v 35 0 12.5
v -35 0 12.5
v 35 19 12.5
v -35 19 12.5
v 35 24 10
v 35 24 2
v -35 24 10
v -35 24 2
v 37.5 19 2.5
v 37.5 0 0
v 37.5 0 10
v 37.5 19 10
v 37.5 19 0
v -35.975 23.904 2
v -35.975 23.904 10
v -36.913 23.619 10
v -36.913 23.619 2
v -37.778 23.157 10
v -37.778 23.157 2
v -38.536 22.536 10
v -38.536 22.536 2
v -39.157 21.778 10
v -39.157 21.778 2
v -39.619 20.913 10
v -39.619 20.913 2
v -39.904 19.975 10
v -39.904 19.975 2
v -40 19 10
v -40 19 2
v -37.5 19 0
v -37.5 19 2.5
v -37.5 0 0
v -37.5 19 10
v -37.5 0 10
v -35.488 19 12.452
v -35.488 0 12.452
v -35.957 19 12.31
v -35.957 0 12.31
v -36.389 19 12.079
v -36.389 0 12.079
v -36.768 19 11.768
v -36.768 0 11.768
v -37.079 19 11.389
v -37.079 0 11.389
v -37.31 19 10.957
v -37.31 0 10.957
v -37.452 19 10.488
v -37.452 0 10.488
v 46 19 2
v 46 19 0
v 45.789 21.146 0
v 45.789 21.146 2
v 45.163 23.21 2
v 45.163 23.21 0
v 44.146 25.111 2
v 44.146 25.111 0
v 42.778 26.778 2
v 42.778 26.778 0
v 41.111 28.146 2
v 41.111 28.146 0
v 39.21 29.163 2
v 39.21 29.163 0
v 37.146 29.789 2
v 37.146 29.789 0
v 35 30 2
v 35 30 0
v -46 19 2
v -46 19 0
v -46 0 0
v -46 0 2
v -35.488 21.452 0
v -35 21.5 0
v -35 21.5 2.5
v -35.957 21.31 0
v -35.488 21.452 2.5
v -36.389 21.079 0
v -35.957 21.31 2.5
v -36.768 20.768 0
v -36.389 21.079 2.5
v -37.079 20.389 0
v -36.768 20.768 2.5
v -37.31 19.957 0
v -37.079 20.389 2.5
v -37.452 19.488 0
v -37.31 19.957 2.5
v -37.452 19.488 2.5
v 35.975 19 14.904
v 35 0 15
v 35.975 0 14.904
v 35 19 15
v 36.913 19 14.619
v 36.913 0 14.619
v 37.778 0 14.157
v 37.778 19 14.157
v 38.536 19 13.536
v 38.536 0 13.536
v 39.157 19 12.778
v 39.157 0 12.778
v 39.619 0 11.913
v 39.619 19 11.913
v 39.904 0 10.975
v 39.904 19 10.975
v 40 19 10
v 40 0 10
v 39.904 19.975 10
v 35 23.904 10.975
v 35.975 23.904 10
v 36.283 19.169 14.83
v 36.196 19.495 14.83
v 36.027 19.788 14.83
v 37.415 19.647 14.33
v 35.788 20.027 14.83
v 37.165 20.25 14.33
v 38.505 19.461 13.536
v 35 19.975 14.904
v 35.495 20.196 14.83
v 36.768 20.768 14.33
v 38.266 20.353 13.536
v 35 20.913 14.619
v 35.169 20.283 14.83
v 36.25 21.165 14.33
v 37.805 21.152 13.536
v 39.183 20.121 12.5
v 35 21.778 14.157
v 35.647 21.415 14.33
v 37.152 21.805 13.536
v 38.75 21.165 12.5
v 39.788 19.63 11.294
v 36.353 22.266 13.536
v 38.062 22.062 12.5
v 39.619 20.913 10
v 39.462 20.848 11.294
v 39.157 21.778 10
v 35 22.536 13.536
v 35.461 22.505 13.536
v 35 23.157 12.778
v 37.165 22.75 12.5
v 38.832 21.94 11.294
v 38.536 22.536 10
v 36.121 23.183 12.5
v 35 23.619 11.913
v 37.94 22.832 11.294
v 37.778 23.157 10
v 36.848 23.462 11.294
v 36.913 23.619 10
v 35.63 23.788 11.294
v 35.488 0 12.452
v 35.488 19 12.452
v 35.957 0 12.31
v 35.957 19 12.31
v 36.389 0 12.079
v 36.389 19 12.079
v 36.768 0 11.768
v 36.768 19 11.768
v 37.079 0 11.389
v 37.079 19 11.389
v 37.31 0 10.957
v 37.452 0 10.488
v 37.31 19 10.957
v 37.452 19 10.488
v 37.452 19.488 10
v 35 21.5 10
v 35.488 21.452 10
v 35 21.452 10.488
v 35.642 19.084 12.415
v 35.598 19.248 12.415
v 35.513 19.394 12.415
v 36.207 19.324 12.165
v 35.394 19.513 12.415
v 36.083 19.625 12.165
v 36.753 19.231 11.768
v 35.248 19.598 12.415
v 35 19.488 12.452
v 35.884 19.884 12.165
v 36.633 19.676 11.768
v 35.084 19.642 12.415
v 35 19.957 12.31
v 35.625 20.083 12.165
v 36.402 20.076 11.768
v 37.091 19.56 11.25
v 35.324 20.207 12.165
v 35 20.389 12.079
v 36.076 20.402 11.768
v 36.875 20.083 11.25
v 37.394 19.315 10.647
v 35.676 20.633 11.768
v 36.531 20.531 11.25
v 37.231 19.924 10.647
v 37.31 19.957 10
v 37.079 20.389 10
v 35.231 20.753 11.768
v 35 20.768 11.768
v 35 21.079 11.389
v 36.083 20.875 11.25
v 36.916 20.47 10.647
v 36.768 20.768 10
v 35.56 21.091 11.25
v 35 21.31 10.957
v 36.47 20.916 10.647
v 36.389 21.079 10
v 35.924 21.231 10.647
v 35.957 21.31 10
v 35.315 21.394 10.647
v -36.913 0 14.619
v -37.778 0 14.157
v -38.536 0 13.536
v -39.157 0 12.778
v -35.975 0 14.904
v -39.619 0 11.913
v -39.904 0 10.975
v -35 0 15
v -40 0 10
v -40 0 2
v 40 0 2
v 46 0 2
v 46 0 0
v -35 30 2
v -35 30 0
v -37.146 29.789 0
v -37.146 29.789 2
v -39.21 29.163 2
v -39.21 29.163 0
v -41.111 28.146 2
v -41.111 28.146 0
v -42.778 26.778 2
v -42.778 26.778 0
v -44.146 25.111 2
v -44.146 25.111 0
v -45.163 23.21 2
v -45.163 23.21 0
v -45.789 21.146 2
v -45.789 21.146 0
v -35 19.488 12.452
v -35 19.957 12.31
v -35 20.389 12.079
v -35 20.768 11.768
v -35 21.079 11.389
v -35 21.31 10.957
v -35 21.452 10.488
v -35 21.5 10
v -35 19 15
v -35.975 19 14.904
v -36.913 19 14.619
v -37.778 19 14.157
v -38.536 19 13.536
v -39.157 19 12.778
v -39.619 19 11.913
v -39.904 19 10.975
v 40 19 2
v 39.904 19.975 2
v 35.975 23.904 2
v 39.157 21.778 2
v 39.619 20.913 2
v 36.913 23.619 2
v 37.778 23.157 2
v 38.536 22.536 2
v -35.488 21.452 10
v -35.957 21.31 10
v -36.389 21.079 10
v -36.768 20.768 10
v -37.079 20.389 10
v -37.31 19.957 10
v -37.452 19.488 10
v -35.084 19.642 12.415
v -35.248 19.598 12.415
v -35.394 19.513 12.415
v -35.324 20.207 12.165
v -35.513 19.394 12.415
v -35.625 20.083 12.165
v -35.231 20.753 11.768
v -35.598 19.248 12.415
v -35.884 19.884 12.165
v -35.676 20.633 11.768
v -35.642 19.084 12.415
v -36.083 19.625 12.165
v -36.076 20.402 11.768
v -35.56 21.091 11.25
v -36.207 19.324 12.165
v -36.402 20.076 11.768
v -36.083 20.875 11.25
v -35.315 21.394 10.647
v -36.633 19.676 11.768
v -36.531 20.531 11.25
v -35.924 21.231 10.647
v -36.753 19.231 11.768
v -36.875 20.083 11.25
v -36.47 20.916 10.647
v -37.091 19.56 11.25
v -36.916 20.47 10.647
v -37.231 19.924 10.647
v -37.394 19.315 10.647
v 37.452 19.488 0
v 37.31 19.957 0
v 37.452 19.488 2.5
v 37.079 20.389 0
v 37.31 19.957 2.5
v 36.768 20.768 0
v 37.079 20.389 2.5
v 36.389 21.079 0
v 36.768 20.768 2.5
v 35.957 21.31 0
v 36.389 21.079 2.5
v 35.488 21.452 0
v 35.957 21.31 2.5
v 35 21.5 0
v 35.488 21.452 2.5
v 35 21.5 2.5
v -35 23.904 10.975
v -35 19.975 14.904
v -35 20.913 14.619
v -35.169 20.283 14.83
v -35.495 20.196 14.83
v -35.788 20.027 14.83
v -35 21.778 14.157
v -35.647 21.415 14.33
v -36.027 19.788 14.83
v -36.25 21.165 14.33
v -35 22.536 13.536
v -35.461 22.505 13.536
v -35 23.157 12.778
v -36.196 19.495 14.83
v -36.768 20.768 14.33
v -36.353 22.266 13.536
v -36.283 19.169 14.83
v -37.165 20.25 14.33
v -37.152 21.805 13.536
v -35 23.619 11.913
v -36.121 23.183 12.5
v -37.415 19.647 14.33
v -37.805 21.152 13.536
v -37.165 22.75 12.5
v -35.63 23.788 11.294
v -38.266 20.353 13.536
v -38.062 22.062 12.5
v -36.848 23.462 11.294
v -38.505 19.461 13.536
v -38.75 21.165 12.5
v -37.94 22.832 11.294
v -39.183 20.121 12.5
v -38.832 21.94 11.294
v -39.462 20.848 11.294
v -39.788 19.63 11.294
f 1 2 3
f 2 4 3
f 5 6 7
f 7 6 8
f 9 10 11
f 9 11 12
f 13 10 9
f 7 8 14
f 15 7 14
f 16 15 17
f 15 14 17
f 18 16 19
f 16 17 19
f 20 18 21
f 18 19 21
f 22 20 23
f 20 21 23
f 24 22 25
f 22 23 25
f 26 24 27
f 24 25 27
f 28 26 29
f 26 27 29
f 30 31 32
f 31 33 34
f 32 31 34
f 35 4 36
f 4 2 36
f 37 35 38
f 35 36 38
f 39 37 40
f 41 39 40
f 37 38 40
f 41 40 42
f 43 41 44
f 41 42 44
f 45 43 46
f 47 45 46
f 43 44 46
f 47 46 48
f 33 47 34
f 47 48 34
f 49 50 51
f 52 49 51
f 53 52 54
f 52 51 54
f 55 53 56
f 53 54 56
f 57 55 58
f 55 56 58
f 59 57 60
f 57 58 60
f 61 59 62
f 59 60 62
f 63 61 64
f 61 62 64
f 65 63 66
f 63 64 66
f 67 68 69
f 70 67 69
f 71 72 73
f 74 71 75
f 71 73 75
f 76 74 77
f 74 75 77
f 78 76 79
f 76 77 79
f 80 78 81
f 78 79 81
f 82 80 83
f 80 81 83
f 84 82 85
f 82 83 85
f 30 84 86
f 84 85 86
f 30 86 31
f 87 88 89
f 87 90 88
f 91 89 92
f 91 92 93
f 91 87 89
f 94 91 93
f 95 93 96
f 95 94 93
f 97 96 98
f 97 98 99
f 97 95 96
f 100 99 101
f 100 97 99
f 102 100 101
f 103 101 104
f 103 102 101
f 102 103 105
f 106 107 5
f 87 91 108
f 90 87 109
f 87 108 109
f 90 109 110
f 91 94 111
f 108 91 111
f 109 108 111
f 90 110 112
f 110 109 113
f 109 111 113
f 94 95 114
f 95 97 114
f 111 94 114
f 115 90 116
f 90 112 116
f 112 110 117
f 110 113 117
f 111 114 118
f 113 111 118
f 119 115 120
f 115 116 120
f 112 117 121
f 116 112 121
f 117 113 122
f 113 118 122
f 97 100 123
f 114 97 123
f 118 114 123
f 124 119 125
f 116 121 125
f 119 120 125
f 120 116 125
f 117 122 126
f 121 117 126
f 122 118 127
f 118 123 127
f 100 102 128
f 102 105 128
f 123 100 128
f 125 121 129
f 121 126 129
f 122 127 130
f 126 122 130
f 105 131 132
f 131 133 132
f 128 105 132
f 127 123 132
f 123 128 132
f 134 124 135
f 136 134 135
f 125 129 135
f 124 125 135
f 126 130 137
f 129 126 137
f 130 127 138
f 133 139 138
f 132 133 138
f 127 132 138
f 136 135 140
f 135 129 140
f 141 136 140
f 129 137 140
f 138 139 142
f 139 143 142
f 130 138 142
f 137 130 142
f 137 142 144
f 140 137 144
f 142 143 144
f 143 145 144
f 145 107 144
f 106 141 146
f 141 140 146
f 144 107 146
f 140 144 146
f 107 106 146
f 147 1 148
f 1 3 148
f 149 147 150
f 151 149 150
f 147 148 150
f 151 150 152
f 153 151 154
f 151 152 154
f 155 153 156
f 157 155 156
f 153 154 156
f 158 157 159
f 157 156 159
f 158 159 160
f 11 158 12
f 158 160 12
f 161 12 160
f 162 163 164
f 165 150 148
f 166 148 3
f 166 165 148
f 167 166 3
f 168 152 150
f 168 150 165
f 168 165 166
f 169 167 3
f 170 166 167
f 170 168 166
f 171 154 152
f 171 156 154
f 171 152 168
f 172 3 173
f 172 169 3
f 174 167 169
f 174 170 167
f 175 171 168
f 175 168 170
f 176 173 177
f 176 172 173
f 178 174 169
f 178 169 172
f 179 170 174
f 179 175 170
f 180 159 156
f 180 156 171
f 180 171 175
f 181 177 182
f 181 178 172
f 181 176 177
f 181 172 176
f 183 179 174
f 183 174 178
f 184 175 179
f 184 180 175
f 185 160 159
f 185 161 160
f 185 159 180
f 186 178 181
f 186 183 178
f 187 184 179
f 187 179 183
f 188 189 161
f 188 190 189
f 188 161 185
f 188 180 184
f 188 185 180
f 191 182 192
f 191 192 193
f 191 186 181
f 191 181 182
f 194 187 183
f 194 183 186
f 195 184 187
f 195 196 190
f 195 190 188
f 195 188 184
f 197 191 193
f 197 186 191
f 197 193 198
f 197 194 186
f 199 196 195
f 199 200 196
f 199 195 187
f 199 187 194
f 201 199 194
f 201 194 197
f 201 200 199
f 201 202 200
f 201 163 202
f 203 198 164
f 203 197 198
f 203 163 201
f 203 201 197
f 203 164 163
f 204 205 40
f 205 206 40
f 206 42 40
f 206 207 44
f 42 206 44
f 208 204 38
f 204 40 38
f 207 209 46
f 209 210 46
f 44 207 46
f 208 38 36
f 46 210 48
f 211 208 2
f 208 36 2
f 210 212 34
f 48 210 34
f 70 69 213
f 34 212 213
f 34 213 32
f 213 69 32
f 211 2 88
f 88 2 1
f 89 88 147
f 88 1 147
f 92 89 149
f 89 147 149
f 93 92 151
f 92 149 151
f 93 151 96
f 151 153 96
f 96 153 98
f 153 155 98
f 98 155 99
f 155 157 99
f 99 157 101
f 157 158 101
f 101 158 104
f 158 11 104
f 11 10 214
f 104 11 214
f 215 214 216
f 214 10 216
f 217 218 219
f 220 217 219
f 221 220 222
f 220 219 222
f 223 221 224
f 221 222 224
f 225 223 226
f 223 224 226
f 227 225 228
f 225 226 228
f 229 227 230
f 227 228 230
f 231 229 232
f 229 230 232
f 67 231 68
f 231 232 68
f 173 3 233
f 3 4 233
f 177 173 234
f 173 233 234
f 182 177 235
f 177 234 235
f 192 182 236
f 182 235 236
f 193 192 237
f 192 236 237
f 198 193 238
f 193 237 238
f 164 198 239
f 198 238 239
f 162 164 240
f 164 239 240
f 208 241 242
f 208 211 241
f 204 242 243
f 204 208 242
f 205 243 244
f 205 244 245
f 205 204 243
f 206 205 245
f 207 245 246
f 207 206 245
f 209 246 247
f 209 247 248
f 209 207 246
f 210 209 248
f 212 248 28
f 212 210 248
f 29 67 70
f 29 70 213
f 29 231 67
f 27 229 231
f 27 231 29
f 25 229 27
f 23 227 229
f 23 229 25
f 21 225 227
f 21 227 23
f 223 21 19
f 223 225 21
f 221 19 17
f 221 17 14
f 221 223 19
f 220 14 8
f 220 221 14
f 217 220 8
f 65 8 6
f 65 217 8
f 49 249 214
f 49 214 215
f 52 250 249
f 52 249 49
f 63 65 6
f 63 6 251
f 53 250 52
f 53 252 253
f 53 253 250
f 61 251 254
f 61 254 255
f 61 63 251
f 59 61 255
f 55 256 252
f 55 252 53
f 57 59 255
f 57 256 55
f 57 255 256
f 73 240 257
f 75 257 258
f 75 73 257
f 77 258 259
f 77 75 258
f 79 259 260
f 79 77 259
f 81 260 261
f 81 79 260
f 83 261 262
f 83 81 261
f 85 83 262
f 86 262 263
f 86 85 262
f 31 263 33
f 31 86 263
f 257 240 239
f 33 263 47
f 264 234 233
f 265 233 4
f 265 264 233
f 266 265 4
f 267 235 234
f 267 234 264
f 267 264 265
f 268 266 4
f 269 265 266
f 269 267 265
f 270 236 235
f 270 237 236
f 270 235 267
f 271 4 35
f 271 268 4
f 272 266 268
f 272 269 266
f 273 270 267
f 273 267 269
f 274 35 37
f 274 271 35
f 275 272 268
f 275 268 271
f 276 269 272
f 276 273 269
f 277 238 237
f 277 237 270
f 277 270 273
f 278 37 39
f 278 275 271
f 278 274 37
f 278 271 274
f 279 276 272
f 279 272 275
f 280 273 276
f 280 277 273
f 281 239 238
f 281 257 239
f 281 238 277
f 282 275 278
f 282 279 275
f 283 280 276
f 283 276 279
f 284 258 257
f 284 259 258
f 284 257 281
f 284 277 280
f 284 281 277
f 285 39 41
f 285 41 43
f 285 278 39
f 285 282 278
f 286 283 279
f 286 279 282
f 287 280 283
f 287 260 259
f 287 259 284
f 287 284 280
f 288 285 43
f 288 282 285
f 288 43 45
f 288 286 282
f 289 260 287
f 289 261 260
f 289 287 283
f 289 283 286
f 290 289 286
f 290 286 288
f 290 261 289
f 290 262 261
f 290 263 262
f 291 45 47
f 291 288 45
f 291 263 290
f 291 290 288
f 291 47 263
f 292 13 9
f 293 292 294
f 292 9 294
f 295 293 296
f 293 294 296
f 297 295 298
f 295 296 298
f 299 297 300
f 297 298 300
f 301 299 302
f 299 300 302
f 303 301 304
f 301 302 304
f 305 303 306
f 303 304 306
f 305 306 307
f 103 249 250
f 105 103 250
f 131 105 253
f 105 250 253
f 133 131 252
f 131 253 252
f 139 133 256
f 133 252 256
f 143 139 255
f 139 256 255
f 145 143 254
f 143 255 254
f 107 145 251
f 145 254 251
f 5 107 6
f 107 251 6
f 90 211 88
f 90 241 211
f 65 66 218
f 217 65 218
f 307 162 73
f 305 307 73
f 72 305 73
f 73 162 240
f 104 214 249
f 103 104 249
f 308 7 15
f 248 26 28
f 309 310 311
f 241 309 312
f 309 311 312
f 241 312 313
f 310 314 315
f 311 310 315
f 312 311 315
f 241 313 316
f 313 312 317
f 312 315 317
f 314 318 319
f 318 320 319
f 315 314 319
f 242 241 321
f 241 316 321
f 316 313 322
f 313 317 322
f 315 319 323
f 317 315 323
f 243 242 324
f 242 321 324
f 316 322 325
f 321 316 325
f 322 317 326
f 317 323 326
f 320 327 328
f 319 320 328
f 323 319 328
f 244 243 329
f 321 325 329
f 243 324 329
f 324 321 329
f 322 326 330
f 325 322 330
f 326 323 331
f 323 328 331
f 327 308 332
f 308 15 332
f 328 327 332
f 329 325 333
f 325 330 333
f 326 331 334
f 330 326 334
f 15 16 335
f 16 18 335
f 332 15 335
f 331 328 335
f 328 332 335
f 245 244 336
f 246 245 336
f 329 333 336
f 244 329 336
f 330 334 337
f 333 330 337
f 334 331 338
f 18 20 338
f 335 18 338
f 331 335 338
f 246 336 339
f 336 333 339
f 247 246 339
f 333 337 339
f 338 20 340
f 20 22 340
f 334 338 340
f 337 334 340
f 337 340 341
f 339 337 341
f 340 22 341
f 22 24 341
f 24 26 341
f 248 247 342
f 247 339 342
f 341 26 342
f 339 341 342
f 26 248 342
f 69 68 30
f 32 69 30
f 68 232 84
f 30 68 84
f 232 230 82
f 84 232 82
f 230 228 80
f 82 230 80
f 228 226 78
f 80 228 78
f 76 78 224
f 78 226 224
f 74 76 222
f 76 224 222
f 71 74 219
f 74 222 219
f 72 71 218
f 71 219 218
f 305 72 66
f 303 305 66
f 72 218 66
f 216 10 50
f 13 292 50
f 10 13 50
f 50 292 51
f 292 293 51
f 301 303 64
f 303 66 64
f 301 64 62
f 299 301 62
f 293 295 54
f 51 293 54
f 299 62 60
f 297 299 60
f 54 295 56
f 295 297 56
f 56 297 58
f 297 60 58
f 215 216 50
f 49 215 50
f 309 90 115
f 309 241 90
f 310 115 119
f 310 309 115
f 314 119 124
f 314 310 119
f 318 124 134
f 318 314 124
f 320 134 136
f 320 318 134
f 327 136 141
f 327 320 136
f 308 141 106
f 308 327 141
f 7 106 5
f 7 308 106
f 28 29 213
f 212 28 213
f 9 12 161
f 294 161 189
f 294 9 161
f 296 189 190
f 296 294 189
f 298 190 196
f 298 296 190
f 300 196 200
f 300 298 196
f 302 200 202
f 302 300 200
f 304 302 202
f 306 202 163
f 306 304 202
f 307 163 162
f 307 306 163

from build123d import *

# Parameters (mm, degrees)
F1_DEPTH = 2
F3_DEPTH = 15
F4_R     = 5
F5_T     = -2.5
F7_DEPTH = 25


with BuildPart() as f1:
    # F0 (on Top) → F1 (new body)
    with BuildSketch(Plane.XY):
        with BuildLine():
            Line((-46, 19), (-46, 0))
            Line((-46, 0), (-40, 0))
            Line((-40, 0), (-40, 19))
            ThreePointArc((-40, 19), (-38.5355339059, 22.5355339059), (-35, 24))
            Line((-35, 24), (35, 24))
            ThreePointArc((35, 24), (38.5355339059, 22.5355339059), (40, 19))
            Line((40, 19), (40, 0))
            Line((40, 0), (46, 0))
            Line((46, 0), (46, 19))
            ThreePointArc((46, 19), (42.7781745931, 26.7781745931), (35, 30))
            Line((35, 30), (-35, 30))
            ThreePointArc((-35, 30), (-42.7781745931, 26.7781745931), (-46, 19))
        make_face()
    extrude(amount=F1_DEPTH)

    # F2 (on Top) → F3 (join)
    with BuildSketch(Plane.XY):
        with BuildLine():
            Line((-40, 0), (40, 0))
            Line((40, 0), (40, 19))
            ThreePointArc((40, 19), (38.5355339059, 22.5355339059), (35, 24))
            Line((35, 24), (-35, 24))
            ThreePointArc((-35, 24), (-38.5355339059, 22.5355339059), (-40, 19))
            Line((-40, 19), (-40, 0))
        make_face()
    extrude(amount=F3_DEPTH)

    # F4
    f4_edges = [f1.edges().sort_by_distance(p)[0] for p in [
        (-40, 9.5, 15),
    ]]
    fillet(f4_edges, radius=F4_R)

    # F5
    f5_openings = [f1.faces().sort_by_distance(p)[0] for p in [
        (0, 0, 7.31497),
    ]]
    offset(amount=F5_T, openings=f5_openings)

    # F6 (on face) → F7 (cut)
    with BuildSketch(Plane.XY.offset(2.5)):
        with BuildLine():
            ThreePointArc((37.5, 19), (36.767766953, 20.767766953), (35, 21.5))
            Line((35, 21.5), (-35, 21.5))
            ThreePointArc((-35, 21.5), (-36.767766953, 20.767766953), (-37.5, 19))
            Line((-37.5, 19), (-37.5, 0))
            Line((-37.5, 0), (37.5, 0))
            Line((37.5, 0), (37.5, 19))
        make_face()
    extrude(amount=-F7_DEPTH, mode=Mode.SUBTRACT)


solid = f1.part
